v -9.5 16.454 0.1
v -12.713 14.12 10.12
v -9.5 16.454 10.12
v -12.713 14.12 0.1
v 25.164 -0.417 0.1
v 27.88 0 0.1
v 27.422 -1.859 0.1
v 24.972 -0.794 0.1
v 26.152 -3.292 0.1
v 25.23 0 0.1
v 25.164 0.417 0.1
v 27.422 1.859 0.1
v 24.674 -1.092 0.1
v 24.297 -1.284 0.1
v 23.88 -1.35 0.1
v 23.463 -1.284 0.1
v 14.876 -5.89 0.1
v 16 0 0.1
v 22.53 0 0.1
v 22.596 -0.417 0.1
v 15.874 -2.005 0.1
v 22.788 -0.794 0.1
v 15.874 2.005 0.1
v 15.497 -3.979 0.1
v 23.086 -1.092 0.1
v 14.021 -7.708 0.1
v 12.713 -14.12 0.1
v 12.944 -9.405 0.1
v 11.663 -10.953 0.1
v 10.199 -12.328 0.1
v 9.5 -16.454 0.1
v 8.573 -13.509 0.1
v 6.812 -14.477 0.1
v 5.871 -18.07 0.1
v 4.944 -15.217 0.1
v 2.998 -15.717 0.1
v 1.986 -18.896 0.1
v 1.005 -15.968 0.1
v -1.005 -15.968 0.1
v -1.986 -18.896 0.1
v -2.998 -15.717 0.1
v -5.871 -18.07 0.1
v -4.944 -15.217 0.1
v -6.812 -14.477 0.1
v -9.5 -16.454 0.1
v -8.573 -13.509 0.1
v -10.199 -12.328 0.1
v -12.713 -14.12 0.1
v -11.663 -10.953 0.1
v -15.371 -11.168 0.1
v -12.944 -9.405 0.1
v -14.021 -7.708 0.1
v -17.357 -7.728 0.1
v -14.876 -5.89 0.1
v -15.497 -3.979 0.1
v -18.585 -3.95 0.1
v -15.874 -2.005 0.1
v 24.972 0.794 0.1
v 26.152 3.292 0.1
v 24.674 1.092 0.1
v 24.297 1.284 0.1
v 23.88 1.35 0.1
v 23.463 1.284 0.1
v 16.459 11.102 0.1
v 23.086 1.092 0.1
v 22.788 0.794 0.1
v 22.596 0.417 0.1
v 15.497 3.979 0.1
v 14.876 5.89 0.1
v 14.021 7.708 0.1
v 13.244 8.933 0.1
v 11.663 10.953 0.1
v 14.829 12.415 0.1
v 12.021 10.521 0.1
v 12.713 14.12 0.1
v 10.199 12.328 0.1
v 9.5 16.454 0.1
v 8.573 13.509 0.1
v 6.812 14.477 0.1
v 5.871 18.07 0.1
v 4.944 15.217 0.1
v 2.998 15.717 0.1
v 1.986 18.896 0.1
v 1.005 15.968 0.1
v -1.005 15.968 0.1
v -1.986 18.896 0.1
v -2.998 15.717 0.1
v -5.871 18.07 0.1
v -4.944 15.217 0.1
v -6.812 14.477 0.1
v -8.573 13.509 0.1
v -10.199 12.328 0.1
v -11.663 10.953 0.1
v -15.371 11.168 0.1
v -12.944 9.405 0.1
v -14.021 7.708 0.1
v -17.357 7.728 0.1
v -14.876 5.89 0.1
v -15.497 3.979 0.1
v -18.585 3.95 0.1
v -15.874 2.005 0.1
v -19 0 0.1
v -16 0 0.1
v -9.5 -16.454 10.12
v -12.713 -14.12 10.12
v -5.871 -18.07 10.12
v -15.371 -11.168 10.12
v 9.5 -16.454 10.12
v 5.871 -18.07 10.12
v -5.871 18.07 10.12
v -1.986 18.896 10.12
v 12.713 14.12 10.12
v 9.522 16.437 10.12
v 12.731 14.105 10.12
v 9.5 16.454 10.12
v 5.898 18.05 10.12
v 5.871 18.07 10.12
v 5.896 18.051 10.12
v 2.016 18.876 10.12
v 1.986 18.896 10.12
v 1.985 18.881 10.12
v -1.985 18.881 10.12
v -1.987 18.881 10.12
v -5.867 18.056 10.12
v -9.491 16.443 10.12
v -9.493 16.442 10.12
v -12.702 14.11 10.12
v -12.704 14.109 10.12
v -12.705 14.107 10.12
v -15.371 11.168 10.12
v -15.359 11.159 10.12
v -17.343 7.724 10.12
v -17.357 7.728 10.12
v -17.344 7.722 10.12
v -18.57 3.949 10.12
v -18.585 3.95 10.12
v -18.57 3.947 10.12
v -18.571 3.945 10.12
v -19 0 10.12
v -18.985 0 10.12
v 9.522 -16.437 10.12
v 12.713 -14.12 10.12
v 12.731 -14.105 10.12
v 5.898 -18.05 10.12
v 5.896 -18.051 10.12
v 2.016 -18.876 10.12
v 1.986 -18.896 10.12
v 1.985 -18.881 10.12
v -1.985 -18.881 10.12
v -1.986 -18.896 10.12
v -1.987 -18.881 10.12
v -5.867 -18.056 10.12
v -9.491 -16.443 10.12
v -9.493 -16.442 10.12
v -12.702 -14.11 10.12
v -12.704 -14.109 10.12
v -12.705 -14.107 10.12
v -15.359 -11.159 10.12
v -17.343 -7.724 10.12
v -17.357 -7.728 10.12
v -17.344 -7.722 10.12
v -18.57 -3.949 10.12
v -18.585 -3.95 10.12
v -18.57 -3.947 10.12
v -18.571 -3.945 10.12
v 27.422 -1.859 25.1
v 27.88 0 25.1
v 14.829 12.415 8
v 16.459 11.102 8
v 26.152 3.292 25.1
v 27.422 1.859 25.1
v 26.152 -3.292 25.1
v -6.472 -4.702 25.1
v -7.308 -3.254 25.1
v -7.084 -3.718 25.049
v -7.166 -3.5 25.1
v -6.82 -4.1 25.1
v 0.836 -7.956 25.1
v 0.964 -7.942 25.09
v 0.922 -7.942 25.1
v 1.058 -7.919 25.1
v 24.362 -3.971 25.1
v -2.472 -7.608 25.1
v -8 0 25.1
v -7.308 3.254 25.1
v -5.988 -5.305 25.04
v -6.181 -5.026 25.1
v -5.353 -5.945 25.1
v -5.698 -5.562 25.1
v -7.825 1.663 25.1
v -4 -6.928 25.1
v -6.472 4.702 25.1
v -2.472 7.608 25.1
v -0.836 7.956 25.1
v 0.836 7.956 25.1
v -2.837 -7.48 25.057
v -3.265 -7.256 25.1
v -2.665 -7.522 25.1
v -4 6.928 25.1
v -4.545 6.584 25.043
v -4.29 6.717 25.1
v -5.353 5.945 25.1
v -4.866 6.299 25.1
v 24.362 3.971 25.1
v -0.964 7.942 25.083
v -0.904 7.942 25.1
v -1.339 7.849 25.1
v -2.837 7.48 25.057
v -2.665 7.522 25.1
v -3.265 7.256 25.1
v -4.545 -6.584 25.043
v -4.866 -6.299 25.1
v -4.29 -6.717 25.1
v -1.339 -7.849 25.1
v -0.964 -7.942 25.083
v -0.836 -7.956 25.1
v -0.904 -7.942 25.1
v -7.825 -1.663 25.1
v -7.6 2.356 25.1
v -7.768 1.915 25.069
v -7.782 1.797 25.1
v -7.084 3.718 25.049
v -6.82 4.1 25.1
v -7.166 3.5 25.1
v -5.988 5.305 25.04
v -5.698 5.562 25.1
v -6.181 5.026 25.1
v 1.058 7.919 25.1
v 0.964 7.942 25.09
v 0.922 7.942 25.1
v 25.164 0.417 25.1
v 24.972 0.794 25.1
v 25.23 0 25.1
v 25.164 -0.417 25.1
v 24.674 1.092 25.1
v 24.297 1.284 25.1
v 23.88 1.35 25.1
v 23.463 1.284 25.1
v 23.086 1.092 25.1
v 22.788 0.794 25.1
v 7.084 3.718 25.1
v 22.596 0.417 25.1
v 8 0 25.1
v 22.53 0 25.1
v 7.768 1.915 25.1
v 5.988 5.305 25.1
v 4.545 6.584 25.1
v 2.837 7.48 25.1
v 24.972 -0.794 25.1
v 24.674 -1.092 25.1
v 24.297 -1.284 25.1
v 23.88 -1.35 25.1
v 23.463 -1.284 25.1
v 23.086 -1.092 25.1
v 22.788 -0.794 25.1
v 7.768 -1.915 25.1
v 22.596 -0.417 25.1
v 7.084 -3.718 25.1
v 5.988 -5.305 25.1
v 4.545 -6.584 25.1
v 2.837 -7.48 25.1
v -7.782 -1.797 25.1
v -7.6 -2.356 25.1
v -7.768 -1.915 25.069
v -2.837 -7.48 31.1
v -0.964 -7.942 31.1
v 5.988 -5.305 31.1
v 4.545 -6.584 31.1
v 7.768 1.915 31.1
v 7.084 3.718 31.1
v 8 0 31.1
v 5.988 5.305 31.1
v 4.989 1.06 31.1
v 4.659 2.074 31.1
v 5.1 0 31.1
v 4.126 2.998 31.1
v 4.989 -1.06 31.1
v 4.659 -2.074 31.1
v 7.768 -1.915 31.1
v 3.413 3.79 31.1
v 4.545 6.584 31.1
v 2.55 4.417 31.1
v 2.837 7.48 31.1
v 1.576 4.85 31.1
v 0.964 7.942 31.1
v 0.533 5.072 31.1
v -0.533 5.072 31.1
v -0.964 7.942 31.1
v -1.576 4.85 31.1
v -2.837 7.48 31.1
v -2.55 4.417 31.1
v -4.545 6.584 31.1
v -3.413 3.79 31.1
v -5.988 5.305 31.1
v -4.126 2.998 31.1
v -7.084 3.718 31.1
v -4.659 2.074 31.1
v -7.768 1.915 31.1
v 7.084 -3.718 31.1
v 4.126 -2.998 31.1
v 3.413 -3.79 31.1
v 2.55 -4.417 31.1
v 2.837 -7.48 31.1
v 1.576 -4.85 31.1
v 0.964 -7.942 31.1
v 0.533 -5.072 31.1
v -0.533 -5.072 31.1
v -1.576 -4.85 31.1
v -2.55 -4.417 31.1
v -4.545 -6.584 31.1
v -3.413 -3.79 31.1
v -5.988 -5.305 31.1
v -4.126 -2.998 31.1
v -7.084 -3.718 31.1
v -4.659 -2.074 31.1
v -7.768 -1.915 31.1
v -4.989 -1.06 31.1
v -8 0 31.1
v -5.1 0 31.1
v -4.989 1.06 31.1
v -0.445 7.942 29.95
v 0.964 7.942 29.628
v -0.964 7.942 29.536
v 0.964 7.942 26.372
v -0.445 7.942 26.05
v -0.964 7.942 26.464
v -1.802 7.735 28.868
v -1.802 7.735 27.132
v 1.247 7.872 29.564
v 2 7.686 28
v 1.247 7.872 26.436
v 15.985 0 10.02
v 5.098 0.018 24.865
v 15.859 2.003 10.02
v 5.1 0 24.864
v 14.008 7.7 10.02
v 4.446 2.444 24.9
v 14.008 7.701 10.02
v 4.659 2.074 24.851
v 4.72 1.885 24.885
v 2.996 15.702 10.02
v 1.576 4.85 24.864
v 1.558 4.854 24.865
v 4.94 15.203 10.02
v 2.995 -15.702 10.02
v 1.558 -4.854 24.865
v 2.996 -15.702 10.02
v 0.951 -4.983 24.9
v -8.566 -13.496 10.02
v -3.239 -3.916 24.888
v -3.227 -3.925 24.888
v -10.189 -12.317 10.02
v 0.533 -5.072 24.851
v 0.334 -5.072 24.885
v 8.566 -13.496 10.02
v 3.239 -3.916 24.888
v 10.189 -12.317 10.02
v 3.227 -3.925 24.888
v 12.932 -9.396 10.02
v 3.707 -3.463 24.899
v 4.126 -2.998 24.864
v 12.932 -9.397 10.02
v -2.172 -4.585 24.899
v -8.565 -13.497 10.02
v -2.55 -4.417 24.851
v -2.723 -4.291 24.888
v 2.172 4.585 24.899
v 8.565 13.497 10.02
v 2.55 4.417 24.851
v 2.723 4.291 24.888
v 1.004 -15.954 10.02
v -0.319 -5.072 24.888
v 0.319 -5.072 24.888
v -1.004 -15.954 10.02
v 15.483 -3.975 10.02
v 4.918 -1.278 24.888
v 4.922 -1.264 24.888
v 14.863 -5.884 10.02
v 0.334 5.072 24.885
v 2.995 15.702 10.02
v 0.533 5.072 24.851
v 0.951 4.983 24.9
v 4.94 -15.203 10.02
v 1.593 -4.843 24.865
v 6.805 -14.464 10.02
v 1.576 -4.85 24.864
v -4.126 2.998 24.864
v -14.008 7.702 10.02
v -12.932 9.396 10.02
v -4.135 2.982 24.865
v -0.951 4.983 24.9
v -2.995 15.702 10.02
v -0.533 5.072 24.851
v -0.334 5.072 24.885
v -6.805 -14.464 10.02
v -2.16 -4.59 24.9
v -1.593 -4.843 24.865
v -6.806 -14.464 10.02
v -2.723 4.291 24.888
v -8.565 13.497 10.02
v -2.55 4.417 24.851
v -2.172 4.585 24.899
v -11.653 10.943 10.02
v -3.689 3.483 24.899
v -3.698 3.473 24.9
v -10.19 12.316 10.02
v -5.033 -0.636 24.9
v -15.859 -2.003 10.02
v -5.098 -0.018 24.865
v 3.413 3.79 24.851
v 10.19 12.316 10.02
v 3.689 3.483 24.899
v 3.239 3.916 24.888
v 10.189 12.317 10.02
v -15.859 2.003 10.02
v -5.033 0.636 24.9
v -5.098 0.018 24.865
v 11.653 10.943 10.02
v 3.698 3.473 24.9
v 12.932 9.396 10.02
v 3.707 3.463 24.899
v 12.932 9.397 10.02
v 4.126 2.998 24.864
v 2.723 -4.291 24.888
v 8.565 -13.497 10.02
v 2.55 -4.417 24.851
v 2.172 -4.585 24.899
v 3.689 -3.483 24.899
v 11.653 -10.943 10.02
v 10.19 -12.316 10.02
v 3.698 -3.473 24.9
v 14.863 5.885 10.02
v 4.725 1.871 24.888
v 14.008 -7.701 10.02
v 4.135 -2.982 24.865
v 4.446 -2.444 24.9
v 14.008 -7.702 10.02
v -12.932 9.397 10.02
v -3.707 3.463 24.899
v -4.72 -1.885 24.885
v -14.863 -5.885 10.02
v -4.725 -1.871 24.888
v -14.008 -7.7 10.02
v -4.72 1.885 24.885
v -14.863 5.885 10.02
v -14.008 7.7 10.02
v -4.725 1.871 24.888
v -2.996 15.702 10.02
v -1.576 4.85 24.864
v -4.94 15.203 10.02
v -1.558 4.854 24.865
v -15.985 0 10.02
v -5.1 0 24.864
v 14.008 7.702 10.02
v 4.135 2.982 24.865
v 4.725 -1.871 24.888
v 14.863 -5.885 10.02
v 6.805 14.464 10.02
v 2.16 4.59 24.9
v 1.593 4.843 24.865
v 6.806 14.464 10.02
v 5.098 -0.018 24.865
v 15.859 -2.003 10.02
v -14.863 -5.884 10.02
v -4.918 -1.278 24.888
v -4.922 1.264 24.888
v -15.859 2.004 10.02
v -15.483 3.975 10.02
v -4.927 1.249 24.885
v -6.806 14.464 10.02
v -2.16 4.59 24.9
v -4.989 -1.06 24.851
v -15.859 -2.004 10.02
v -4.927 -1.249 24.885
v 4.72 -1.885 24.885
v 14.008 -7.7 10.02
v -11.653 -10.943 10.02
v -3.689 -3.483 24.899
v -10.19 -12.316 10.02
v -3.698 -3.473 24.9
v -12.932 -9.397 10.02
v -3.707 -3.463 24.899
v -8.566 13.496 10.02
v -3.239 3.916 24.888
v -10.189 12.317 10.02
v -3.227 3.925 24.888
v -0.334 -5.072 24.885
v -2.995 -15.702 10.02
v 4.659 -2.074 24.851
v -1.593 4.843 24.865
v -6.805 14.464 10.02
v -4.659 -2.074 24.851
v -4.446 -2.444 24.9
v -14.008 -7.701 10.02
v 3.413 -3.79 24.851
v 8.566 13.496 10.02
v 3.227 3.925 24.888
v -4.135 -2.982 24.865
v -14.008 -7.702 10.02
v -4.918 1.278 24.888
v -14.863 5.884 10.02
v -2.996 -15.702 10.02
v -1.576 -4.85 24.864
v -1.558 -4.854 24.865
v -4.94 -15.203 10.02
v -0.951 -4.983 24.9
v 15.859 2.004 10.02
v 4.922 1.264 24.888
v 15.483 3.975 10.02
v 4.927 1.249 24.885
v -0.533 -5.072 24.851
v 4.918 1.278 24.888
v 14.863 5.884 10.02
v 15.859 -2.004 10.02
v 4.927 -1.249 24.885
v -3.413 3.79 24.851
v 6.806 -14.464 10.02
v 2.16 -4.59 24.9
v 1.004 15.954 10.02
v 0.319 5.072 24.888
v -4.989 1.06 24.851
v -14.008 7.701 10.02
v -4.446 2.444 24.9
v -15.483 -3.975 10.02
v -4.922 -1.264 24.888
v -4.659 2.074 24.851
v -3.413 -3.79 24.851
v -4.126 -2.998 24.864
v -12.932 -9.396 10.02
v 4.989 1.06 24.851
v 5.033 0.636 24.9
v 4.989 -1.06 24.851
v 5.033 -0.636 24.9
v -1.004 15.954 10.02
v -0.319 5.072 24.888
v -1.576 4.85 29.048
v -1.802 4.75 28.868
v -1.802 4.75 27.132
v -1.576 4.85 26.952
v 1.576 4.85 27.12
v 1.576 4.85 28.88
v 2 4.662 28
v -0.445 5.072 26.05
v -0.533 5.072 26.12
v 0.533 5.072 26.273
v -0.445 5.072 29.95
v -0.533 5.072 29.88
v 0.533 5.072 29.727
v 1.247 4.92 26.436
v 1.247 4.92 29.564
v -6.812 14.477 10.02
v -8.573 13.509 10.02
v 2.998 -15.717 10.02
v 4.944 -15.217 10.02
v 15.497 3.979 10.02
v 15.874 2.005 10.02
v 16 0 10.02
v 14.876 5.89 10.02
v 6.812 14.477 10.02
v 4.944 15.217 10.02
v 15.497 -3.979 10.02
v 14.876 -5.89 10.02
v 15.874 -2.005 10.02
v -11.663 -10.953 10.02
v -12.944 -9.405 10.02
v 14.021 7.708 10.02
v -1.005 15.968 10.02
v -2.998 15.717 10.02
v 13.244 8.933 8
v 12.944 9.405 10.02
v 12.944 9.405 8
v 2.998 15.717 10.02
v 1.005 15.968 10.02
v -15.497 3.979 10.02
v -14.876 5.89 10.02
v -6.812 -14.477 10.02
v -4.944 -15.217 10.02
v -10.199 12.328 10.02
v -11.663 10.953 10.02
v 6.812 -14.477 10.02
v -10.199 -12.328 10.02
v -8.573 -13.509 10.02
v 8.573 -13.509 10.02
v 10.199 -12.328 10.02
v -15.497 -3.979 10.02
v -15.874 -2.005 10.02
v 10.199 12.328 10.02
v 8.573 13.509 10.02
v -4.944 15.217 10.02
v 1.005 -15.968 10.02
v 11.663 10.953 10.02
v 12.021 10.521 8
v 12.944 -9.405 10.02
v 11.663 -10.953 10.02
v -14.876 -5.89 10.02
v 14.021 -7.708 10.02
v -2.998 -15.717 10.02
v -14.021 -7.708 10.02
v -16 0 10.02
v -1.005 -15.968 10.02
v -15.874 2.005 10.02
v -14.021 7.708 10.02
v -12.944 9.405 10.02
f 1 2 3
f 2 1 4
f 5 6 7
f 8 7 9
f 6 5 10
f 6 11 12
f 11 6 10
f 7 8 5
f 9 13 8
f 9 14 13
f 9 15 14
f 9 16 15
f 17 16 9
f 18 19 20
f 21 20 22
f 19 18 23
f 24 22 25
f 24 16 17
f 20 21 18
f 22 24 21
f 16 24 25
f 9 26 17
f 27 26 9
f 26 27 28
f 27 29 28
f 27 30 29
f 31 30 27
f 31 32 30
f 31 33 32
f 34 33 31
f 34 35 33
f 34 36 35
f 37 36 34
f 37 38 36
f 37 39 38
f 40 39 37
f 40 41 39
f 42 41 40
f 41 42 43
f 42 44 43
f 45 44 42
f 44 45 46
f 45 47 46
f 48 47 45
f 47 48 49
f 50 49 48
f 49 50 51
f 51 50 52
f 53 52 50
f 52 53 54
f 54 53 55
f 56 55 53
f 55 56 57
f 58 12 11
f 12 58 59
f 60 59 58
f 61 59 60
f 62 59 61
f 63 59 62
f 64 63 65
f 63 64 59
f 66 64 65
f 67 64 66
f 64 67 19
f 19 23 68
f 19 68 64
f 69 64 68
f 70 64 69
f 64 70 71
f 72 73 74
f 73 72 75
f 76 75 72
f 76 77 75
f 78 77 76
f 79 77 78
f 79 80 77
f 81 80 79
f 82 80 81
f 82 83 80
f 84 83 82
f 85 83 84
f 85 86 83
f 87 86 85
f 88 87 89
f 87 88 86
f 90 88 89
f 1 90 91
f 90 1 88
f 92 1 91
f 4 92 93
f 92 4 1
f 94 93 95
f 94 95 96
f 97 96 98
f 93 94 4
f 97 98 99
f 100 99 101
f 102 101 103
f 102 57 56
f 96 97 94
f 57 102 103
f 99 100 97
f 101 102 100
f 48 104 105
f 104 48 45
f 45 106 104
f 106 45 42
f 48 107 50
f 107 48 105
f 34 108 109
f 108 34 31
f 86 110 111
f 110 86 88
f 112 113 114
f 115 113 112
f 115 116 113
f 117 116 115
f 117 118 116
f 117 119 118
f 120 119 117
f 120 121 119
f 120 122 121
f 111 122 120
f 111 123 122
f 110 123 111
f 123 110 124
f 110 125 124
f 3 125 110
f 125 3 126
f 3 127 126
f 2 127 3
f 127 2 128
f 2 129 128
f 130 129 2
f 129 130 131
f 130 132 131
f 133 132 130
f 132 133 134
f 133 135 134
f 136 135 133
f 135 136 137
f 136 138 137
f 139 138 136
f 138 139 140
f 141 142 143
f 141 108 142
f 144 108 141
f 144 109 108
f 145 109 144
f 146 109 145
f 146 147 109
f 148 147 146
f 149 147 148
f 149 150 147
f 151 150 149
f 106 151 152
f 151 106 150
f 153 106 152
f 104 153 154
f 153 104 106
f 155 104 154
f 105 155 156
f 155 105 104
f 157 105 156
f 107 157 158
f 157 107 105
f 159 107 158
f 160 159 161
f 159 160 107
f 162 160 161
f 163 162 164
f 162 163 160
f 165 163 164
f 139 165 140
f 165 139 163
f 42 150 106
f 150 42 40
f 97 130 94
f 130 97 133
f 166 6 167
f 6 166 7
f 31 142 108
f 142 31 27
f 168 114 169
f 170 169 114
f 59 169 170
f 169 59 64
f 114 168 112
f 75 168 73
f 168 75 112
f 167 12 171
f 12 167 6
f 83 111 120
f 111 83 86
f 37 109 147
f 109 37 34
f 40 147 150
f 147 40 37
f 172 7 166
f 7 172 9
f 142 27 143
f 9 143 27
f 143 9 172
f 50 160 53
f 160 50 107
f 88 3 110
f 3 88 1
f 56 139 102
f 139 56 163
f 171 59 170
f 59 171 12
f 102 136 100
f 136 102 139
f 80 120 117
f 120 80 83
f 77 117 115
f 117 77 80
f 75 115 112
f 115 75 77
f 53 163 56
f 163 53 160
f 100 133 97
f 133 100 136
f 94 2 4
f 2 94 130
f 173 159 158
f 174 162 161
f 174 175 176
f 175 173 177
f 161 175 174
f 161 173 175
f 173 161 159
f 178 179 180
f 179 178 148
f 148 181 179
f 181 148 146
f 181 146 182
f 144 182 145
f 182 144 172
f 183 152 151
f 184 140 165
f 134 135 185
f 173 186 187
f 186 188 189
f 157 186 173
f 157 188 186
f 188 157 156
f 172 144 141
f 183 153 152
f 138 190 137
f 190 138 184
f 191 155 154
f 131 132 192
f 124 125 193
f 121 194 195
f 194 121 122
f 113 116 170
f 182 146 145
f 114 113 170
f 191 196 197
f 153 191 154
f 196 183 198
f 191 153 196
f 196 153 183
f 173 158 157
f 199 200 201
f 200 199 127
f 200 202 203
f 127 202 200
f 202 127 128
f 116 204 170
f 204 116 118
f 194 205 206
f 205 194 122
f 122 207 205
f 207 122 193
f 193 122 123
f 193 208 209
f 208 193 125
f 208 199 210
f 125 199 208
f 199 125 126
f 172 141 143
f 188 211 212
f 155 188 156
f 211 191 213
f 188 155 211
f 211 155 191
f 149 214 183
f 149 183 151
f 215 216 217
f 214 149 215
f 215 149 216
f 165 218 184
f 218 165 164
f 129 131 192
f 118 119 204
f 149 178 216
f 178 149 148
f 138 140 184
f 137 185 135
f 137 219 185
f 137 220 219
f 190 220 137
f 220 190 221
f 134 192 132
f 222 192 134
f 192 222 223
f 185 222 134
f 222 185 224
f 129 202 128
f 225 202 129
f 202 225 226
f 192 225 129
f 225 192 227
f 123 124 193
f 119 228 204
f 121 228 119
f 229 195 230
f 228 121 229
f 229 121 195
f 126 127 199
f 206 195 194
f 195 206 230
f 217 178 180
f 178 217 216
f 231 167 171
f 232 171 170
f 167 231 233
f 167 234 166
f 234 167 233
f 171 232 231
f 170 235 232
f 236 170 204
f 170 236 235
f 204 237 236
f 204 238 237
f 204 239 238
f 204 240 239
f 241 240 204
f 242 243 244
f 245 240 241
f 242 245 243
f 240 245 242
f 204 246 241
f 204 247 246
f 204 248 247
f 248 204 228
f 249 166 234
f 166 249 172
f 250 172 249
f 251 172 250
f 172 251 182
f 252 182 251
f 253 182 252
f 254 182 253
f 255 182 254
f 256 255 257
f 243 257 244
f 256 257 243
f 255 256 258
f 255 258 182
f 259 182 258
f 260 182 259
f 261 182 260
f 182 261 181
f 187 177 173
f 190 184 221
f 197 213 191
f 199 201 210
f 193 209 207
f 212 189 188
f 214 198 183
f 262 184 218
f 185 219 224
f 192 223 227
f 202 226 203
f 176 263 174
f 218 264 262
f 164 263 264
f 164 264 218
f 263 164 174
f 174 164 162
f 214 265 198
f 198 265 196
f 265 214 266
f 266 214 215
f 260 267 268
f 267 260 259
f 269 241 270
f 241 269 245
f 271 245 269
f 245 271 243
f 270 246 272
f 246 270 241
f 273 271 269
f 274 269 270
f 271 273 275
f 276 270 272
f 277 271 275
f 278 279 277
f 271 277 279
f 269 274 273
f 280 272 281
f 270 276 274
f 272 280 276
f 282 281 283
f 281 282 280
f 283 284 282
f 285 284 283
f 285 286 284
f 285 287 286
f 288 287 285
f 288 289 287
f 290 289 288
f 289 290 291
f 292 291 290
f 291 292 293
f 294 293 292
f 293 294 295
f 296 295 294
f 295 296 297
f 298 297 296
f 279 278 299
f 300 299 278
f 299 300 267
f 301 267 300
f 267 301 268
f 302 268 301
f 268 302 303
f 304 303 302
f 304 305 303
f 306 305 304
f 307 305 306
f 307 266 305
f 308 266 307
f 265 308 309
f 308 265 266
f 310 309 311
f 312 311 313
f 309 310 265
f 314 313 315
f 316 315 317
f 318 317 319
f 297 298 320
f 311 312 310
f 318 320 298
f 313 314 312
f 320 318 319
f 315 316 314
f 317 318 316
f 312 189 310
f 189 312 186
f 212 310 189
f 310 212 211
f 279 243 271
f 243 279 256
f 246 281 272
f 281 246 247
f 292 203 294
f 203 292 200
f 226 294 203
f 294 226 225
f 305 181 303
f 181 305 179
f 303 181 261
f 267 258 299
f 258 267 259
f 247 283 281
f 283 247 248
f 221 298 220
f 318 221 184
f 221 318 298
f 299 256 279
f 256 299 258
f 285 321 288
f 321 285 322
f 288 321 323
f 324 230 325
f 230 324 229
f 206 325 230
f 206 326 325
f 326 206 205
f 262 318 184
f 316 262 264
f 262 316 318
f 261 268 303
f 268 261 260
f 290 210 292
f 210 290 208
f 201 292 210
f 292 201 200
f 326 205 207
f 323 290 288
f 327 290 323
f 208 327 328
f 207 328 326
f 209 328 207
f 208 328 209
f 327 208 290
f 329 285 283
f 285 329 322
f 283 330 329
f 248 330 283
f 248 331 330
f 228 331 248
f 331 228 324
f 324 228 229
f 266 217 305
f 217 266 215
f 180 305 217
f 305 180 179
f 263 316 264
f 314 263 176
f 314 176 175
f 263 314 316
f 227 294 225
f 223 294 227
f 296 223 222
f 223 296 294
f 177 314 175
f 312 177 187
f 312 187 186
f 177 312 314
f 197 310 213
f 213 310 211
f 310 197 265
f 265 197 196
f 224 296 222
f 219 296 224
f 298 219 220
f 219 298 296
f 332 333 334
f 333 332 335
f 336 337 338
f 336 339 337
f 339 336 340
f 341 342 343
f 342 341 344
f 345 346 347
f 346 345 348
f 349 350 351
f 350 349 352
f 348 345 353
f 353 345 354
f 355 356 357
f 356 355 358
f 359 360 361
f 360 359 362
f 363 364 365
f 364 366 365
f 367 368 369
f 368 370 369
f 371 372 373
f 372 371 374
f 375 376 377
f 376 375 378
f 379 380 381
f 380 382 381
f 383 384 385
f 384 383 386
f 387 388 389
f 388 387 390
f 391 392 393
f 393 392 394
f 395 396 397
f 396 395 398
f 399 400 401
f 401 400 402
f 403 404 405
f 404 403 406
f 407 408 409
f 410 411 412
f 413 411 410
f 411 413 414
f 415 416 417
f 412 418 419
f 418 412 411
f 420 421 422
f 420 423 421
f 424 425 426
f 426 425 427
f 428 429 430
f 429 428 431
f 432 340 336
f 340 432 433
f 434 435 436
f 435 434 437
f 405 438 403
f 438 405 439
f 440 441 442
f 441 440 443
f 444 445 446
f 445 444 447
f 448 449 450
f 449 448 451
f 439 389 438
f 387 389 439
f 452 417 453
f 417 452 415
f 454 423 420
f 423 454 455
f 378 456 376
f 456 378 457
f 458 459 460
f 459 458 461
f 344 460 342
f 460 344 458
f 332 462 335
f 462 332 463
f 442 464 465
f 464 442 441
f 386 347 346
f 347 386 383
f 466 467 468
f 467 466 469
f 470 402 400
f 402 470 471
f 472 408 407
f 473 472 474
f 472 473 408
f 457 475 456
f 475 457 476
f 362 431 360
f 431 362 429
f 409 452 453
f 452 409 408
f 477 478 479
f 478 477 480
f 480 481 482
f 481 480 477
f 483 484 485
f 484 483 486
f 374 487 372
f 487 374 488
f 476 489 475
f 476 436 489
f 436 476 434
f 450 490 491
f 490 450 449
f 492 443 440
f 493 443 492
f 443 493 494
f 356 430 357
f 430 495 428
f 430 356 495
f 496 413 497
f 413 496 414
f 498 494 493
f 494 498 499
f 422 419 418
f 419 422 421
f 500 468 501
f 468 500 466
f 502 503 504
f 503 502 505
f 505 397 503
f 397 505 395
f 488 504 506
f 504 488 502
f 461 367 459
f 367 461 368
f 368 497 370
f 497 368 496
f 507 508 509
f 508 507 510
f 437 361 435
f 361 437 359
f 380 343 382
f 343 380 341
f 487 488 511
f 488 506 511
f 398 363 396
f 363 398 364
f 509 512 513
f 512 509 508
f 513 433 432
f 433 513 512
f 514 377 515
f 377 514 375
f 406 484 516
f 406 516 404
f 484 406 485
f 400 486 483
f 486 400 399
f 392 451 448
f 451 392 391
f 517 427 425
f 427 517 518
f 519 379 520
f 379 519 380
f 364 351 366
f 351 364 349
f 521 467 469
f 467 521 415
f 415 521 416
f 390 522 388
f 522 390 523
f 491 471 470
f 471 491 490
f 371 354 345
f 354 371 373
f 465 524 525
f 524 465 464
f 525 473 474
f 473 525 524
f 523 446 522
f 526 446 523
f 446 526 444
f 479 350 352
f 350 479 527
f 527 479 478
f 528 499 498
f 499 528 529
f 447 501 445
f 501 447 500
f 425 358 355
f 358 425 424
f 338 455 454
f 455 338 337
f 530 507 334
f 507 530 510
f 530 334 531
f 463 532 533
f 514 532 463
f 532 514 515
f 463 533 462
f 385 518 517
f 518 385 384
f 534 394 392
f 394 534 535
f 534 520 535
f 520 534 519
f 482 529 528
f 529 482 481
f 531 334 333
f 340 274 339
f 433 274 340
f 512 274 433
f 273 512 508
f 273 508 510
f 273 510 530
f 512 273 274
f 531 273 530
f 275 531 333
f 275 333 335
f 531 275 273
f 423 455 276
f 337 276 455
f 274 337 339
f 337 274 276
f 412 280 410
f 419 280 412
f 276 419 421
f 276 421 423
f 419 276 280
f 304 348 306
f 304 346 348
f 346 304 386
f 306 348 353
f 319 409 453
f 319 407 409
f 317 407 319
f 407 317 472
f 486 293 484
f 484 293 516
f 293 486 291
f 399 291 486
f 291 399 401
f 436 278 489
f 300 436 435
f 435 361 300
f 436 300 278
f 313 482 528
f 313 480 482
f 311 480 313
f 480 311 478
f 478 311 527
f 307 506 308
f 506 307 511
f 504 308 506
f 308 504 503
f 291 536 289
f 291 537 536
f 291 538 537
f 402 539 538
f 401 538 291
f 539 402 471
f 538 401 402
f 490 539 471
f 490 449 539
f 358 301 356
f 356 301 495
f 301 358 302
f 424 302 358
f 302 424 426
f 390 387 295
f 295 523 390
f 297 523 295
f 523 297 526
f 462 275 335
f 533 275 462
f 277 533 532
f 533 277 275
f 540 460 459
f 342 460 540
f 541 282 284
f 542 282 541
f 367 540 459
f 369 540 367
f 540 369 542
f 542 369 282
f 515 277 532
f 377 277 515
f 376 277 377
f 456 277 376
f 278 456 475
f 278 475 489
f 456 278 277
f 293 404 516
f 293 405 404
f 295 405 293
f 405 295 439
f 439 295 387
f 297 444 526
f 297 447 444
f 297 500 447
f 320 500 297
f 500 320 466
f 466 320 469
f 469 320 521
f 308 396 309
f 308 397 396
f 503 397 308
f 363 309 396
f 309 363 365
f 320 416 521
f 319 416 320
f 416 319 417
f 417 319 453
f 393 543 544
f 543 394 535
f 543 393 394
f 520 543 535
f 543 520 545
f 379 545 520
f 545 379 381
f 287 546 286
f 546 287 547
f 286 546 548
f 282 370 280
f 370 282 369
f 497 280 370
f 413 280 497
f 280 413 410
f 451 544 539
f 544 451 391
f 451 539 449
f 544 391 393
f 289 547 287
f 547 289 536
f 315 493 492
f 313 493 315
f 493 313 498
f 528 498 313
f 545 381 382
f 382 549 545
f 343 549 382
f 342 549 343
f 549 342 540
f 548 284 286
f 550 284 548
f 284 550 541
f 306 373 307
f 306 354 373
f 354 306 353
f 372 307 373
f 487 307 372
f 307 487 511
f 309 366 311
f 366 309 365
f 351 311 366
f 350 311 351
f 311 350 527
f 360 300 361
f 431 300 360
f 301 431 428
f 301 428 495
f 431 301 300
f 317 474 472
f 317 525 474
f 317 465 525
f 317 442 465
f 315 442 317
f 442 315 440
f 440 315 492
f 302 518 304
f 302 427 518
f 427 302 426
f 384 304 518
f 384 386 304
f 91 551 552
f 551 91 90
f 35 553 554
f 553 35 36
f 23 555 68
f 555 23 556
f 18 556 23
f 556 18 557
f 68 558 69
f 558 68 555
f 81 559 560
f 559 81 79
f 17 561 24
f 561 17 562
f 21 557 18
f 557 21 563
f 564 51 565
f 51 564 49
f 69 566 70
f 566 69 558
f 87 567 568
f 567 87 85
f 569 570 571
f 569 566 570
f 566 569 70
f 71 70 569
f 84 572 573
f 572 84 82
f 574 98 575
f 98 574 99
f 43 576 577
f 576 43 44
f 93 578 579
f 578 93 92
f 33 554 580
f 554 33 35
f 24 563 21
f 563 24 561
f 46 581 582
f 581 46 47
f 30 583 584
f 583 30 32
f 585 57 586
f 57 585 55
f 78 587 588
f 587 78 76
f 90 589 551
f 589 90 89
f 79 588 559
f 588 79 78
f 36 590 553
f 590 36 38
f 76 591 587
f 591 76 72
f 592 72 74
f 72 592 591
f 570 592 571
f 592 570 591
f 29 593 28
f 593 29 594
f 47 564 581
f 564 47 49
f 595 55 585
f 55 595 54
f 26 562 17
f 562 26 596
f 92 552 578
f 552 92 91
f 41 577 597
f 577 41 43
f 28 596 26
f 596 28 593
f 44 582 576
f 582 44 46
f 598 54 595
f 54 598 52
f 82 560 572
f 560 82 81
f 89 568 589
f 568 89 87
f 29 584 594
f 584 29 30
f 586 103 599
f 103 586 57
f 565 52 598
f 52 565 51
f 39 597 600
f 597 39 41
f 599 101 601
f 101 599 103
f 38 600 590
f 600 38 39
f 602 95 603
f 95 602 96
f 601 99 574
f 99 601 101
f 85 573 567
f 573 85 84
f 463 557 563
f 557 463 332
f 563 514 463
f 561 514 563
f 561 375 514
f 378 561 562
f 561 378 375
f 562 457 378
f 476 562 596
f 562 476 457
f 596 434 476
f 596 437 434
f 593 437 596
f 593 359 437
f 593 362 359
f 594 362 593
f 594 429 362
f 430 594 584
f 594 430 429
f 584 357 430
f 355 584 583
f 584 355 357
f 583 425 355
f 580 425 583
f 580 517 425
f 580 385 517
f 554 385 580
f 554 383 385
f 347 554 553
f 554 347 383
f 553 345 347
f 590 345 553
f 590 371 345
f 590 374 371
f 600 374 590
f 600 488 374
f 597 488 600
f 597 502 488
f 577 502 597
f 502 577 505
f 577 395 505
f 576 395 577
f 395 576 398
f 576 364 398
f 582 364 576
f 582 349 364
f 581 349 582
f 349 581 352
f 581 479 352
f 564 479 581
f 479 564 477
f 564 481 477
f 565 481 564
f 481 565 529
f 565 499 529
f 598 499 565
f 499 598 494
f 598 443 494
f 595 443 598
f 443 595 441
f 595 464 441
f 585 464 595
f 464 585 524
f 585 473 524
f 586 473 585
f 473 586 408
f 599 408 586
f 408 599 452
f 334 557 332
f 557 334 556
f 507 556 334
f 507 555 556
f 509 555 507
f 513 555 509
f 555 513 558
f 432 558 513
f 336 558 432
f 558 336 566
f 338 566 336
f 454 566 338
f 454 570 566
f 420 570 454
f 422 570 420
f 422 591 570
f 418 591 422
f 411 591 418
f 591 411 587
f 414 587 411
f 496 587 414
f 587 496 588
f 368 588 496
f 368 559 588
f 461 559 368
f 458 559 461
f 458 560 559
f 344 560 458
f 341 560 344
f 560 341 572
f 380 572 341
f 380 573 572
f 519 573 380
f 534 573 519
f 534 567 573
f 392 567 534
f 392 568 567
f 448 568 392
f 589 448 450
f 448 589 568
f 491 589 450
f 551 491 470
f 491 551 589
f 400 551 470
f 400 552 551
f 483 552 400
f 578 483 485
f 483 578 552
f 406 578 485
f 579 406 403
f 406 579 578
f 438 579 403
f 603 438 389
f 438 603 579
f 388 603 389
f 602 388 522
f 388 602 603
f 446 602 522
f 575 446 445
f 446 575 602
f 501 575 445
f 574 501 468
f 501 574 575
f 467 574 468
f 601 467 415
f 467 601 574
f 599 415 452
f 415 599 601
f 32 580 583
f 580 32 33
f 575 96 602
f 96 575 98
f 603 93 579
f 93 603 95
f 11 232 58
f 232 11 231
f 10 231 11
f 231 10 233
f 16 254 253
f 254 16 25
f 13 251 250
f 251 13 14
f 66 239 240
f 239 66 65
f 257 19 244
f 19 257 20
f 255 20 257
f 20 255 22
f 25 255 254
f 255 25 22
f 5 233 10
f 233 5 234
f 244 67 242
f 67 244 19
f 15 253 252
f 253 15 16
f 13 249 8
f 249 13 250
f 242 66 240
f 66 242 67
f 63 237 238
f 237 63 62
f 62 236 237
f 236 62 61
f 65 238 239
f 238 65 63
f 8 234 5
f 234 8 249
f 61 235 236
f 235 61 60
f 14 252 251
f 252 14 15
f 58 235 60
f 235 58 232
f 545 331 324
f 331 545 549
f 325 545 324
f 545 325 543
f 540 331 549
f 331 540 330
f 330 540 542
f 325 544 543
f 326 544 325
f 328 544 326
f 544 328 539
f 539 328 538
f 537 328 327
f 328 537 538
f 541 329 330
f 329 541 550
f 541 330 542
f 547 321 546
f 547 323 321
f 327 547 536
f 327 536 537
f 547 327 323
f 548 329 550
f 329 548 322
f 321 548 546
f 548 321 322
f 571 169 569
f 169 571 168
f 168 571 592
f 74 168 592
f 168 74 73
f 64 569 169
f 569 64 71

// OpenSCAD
difference(){
translate([0,0,0.1]){
    hull(){
        cylinder(r=19,h=10.02);
        translate([23.88,0,0])cylinder(r=4,h=10.02);
    }
    hull(){
        translate([0,0,10])cylinder(r1=19,r2=8,h=15);
        translate([23.88,0,10])cylinder(r=4,h=15);
    }
    cylinder(r=8,h=31);
}

translate([0,0,10])cylinder(r1=16,r2=5,h=15,$fn=50);
cylinder(r=5.1,h=33,$fn=30);
cylinder(r=16,h=10.02,$fn=50);
translate([23.88,0,0])cylinder(r=2.7/2,h=30,$fn=20);
translate([0,0,28])rotate([-90,0,0])cylinder(r=2,h=15);
rotate([0,0,34])cube([30,2,8]);
}
//23.88
